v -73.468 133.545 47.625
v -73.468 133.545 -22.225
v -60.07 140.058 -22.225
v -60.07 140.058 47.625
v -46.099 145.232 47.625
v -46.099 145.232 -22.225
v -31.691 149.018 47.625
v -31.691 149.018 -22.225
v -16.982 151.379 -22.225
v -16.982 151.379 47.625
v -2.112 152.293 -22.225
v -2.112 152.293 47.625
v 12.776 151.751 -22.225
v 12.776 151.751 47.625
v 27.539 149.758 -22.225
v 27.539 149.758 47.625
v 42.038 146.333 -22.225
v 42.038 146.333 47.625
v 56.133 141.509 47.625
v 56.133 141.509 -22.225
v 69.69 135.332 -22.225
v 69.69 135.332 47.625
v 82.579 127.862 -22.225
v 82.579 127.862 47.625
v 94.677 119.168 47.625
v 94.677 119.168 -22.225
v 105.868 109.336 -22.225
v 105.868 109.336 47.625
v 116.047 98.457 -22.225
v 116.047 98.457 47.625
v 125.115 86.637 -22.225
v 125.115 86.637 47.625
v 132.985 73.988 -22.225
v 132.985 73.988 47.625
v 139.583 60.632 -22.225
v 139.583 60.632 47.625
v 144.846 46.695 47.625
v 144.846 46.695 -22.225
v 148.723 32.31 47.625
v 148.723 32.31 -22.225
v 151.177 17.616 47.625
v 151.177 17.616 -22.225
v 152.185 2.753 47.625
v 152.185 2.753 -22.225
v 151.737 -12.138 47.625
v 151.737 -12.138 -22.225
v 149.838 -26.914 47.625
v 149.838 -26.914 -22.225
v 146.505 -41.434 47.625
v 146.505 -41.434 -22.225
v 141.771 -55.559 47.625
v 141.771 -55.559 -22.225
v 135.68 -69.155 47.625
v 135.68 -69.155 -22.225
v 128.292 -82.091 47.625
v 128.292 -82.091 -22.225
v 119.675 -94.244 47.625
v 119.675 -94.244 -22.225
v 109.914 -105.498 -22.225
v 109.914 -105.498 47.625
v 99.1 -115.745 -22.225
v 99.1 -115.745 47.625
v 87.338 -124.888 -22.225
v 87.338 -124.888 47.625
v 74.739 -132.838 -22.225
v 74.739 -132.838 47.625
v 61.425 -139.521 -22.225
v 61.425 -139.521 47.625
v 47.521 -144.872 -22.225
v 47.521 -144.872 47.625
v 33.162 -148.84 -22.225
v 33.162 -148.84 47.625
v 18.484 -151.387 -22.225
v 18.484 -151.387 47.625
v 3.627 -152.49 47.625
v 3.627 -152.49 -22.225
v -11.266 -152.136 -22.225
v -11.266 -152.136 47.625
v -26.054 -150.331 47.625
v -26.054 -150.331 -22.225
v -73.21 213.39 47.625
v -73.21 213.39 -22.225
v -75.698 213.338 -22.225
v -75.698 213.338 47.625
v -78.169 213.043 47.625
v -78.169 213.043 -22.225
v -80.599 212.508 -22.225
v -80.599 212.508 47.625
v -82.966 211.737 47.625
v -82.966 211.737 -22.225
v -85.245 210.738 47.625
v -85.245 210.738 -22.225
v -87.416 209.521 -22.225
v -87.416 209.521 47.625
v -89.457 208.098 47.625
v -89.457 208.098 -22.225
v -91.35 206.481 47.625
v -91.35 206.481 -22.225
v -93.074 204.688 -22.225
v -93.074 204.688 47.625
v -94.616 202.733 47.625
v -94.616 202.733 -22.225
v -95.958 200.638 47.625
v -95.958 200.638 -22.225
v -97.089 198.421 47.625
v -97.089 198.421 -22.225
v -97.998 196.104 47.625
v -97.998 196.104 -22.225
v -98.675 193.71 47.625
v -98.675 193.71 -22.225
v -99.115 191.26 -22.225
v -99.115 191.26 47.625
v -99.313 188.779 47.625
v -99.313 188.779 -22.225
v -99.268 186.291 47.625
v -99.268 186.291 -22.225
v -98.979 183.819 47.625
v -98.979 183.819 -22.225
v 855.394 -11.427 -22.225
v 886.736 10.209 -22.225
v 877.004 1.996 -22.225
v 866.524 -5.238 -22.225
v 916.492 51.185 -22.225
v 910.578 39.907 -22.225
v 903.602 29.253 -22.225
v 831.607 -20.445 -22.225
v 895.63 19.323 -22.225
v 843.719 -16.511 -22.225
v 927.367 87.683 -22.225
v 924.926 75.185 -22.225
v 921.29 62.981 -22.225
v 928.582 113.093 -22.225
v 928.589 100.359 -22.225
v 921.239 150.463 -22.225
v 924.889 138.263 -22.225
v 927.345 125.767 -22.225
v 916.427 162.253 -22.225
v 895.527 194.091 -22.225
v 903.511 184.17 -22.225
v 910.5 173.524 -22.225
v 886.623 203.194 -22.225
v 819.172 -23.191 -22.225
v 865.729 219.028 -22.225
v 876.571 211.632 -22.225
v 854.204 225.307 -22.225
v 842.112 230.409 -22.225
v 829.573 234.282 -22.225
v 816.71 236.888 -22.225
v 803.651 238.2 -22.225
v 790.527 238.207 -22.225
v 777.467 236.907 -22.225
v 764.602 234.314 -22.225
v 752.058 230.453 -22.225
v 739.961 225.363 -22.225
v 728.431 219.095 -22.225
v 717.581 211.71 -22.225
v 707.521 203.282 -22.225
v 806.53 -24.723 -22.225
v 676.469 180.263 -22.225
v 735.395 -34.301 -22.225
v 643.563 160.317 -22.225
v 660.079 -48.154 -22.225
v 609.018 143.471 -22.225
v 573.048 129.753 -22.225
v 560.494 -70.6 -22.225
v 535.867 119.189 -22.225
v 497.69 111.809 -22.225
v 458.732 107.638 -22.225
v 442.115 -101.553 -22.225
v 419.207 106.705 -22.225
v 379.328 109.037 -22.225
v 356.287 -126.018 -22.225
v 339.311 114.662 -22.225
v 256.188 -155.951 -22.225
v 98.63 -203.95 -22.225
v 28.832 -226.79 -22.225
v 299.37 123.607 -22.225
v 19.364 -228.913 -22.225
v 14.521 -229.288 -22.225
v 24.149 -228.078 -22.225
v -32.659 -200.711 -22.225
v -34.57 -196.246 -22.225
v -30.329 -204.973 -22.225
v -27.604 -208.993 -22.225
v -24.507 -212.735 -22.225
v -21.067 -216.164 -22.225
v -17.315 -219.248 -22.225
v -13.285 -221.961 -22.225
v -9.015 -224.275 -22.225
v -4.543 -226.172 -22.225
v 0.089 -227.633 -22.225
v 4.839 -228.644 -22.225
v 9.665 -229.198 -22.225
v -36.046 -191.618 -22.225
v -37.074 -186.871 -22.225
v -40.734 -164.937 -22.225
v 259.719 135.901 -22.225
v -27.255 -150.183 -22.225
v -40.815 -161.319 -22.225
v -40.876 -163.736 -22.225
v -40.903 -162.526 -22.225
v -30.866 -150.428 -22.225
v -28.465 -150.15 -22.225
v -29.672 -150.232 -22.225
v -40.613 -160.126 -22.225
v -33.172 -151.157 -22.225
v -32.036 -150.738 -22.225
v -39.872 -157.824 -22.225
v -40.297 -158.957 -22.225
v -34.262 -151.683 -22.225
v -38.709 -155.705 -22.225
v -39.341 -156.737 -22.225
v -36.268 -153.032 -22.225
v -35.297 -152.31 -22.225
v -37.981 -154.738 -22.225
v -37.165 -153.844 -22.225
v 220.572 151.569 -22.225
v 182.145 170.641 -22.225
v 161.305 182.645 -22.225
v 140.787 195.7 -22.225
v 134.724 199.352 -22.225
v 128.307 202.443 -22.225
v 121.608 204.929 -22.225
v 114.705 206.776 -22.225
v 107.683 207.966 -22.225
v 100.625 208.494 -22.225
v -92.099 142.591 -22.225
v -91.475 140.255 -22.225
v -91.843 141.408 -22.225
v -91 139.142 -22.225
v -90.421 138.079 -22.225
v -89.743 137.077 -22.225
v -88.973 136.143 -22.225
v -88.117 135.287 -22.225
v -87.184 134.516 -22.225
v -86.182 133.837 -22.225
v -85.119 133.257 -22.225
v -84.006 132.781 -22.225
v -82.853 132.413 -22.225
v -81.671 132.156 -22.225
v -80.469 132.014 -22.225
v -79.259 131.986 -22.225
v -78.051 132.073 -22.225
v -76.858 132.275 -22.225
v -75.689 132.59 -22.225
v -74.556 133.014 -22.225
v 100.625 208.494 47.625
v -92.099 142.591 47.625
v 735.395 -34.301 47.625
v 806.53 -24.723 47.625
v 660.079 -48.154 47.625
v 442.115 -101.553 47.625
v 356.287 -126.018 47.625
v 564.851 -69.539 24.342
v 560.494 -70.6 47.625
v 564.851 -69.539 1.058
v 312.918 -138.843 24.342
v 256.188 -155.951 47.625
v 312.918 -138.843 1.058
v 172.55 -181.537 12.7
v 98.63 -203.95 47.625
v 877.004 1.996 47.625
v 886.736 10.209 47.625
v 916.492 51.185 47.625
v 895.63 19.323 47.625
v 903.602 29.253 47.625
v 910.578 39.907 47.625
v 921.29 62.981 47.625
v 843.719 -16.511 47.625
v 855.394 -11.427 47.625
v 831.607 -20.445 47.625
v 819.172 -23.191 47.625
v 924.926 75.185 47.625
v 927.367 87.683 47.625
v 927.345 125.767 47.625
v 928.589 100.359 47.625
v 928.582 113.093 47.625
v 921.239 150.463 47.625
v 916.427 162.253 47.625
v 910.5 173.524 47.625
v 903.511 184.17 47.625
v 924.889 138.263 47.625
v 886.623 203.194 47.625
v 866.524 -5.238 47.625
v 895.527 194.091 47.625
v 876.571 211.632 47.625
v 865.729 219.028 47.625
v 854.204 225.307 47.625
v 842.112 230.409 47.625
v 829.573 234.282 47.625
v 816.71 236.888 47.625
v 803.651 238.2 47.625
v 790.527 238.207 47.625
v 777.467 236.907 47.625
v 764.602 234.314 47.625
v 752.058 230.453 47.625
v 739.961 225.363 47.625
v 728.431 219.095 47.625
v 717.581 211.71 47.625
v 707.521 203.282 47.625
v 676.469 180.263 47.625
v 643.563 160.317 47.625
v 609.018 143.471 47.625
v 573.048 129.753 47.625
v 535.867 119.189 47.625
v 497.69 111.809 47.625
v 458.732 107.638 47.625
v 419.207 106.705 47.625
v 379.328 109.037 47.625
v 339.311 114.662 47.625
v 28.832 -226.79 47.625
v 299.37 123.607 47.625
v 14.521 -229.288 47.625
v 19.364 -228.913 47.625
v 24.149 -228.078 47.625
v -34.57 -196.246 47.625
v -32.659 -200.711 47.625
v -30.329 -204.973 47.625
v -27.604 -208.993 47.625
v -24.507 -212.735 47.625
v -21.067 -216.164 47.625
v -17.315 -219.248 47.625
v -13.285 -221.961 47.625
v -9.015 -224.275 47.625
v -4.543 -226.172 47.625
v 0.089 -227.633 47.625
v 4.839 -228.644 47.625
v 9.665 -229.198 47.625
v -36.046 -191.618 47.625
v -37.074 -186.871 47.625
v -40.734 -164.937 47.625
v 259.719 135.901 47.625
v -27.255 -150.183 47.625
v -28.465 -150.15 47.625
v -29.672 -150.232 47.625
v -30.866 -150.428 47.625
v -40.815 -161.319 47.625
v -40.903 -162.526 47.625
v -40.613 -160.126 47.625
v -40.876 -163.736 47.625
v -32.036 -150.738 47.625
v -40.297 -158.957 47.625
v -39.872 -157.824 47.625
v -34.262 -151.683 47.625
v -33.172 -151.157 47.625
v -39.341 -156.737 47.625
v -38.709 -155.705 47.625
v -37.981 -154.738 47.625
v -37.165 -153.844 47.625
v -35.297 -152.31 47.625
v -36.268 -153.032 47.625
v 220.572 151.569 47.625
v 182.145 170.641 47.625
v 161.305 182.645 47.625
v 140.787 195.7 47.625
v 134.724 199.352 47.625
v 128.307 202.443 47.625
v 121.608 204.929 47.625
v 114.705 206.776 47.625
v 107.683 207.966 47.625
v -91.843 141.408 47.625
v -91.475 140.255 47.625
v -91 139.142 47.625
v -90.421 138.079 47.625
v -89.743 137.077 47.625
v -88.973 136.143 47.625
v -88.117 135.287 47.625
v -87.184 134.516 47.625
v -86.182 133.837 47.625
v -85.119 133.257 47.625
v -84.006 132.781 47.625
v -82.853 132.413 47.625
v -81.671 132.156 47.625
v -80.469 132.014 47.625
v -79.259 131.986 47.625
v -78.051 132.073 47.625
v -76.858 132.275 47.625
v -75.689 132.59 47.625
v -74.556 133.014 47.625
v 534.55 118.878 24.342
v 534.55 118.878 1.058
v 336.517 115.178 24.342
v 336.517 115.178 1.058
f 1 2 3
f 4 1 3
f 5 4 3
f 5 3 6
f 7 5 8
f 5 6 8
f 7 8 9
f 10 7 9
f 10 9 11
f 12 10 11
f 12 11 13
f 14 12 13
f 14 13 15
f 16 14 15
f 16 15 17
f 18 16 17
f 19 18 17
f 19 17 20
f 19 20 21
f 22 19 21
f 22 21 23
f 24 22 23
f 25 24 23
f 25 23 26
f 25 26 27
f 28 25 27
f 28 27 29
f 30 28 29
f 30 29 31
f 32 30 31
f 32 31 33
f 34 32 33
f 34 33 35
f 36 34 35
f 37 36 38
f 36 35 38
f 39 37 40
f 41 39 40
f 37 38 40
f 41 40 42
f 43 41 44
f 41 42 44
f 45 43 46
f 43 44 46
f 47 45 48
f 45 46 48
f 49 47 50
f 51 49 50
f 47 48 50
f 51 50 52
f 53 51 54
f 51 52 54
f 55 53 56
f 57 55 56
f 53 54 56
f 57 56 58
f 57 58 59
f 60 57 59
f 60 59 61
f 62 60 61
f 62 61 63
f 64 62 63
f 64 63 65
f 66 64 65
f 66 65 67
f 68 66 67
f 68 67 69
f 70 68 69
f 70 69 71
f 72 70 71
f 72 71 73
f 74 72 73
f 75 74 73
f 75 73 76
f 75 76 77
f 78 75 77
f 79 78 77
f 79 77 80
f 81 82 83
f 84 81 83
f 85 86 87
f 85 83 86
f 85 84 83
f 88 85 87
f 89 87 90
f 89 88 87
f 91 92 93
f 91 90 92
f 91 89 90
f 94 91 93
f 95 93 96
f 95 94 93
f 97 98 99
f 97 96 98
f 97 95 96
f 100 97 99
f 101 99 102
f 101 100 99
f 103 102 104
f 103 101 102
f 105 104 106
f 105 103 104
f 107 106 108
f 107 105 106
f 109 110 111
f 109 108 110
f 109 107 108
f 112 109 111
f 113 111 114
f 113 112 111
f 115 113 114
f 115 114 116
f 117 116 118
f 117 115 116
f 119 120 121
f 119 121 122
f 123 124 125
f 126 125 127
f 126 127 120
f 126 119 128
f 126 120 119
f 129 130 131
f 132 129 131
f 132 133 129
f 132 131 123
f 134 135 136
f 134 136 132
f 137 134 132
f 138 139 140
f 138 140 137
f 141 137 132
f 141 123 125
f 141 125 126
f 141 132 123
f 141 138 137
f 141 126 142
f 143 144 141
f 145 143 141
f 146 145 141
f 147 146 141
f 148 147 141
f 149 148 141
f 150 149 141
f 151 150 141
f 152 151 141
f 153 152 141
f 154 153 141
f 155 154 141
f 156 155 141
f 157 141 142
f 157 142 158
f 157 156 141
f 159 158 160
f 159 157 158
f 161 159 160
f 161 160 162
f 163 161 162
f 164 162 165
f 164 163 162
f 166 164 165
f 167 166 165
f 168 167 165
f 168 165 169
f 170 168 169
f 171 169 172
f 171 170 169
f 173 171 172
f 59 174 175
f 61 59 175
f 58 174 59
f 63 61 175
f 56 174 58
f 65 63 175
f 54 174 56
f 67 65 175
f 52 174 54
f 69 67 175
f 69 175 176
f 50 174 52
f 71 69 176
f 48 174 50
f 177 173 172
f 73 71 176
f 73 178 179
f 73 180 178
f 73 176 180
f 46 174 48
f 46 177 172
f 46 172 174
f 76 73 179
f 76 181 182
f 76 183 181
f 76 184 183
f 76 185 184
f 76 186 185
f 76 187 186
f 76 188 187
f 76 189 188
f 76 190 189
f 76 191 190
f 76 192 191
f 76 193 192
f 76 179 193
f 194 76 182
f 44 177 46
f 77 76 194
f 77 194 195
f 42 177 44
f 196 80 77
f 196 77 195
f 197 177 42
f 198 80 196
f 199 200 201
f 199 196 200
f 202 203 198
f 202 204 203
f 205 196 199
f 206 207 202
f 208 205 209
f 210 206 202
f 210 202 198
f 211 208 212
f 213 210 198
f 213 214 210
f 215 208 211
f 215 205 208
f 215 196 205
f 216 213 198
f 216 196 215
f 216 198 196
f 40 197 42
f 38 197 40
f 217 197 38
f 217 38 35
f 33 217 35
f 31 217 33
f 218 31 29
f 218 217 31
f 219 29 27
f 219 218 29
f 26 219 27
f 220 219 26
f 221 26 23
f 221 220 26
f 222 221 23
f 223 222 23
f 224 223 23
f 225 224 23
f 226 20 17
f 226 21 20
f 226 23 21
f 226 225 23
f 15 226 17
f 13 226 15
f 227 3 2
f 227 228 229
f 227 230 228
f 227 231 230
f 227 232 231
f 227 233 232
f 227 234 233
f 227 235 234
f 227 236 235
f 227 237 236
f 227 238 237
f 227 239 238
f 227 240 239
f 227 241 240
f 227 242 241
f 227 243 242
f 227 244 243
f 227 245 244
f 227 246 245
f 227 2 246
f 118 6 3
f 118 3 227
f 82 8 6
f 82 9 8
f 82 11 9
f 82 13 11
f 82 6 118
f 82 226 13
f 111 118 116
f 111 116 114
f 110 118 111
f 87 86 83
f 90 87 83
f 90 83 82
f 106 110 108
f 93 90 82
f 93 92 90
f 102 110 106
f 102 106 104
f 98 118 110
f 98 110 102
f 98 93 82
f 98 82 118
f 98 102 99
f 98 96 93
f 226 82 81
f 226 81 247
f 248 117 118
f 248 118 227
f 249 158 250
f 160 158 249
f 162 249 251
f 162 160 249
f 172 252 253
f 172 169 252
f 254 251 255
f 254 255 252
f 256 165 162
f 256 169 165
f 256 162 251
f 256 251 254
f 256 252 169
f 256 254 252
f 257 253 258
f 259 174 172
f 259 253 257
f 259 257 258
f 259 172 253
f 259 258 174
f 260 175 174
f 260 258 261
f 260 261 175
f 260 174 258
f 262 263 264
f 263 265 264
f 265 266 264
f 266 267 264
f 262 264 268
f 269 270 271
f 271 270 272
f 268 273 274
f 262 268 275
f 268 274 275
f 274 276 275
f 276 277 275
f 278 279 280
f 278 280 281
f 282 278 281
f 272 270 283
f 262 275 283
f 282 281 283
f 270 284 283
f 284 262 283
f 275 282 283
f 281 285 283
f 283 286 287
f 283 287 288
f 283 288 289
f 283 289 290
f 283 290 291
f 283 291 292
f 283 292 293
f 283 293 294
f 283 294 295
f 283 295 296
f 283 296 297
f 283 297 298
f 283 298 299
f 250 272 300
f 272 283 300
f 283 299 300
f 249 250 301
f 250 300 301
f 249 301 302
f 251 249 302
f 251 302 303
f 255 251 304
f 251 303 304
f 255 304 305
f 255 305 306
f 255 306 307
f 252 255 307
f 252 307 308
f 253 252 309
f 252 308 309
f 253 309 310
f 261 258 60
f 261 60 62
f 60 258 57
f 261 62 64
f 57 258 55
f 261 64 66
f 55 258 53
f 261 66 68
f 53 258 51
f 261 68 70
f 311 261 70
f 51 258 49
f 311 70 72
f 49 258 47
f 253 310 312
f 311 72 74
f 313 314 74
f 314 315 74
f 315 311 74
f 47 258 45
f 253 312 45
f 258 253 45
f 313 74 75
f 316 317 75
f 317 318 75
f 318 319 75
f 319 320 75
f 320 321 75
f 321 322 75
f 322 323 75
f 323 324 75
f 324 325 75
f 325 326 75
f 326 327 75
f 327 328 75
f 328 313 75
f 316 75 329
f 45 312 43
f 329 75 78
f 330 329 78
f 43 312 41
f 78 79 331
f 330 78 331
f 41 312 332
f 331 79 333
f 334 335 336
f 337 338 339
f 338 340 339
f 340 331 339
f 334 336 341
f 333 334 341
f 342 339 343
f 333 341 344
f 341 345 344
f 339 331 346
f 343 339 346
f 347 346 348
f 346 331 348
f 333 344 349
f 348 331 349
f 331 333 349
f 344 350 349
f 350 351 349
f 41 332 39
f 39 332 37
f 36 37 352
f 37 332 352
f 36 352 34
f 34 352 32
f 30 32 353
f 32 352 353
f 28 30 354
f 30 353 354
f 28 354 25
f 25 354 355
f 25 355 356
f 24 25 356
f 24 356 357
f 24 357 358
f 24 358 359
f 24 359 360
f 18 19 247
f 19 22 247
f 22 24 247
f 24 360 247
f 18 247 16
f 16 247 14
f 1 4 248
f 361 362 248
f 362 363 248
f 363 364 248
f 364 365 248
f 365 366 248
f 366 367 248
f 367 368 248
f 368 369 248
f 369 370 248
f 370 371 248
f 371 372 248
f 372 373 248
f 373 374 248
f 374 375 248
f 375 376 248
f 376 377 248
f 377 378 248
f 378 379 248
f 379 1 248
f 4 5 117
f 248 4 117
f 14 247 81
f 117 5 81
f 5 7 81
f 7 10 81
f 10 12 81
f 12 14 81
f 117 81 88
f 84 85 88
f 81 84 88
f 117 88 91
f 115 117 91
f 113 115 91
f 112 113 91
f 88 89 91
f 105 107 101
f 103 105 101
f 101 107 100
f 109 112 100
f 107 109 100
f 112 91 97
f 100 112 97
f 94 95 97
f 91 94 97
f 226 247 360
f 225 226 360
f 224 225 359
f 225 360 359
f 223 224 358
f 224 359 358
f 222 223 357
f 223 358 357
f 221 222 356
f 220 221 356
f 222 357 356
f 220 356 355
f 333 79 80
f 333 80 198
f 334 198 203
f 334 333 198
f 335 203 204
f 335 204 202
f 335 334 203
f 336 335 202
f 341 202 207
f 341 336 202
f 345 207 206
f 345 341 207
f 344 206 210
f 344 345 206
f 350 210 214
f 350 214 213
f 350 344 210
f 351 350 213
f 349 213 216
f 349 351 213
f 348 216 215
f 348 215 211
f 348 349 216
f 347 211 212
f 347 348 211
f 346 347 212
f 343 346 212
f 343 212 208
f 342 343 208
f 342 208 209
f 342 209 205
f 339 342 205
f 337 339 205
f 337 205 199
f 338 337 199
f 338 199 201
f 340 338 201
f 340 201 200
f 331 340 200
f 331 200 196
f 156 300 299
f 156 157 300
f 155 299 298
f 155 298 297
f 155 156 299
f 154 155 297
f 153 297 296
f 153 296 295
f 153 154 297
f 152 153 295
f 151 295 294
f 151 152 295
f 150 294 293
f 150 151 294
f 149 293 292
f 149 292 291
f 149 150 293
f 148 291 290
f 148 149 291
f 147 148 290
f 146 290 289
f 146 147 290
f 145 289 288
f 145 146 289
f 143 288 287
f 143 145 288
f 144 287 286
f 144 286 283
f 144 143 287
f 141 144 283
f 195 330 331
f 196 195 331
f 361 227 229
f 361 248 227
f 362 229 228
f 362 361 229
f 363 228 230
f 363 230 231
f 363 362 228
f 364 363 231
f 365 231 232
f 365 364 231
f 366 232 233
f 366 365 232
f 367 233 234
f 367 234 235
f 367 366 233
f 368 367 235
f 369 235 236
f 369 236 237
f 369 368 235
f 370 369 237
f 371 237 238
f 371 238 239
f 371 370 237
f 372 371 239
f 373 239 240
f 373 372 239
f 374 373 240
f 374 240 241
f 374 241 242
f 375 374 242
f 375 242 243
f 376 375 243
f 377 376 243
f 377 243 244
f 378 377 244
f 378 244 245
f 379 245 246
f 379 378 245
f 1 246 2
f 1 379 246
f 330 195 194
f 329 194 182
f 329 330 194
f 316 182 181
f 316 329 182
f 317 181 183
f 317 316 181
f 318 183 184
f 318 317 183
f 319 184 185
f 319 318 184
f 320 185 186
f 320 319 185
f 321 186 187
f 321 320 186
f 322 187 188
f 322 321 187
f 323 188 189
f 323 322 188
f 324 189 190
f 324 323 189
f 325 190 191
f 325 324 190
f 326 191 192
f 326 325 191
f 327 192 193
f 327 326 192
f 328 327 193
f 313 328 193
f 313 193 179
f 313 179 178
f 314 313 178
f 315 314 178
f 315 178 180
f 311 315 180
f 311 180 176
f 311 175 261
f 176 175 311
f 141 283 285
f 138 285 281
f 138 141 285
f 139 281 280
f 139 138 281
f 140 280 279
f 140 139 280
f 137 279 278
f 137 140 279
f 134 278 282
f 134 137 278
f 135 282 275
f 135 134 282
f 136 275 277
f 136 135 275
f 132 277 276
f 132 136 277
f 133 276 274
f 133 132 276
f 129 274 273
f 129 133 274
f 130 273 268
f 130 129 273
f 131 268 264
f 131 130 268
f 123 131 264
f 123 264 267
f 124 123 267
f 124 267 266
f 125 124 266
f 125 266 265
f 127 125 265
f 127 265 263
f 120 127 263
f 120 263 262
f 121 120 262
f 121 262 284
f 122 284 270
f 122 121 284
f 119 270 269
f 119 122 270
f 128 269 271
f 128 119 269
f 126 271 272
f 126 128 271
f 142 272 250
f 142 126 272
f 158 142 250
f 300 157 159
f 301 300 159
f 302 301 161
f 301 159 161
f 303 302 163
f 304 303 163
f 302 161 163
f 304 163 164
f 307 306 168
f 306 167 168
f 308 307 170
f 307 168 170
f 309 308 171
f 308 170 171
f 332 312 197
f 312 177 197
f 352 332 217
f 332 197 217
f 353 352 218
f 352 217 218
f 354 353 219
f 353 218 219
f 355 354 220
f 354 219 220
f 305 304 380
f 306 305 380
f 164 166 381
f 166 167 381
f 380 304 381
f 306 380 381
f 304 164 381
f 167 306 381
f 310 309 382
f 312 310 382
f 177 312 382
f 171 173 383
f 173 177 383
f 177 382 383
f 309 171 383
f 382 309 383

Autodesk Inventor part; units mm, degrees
ref_plane "YZ Plane" through (0, 0, 0) normal (1, 0, 0) x (0, 1, 0)
ref_plane "XZ Plane" through (0, 0, 0) normal (0, 1, 0) x (-1, 0, 0)
ref_plane "XY Plane" through (0, 0, 0) normal (0, 0, 1) x (1, 0, 0)
ref_plane "Work Plane1" through (0, 0, -22.225) normal (0, 0, -1) x (-1, 0, 0)
sketch "Sketch1" plane through (0, 0, -22.225) normal (0, 0, -1) x (-1, 0, 0)
  arc A0 (88.9626, 123.799) -> (43.8693, -146.1511) centre (0.2092, -0.1167) ccw
  line L0 (104.0584, 214.2592) -> (-123.3104, 207.8545)
  line L1 (104.0584, 214.2592) -> (88.9626, 123.799)
  line L2 (27.3448, -245.173) -> (43.8693, -146.1511)
  spline S0 degree 3 poles (-707.521, 203.2816) (-551.4111, 75.786) (-311.6058, 71.5174) (-123.3104, 207.8545) knots 0 0 0 0 1 1 1 1
  spline S1 degree 3 poles (-813.9039, -23.98) (-592.8487, -45.4285) (-280.1393, -149.9031) (-98.6304, -203.95) knots 0 0 0 0 1 1 1 1
  line L3 (-98.6304, -203.95) -> (27.3448, -245.173)
  arc A1 (-707.521, 203.2816) -> (-707.521, 203.2816) centre (-797.0248, 106.6489) ccw
  arc A2 (-707.521, 203.2816) -> (-707.521, 203.2816) centre (-797.0248, 106.6489) ccw
  line L4 (-754.135, 241.3513) -> (-660.9071, 165.2118) construction
  arc A3 (-742.7917, 235.6937) -> (-668.7166, 175.1963) centre (-447.712, 521.4005) ccw construction
  line L5 (-880.3002, -17.5377) -> (-747.5076, -30.4223) construction
  arc A4 (-760.9988, -30.537) -> (-867.0828, -20.2439) centre (-910.7419, -1022.0239) ccw construction
  arc A5 (-707.521, 203.2816) -> (-807.2552, -24.6472) centre (-797.0248, 106.6609) ccw
  point P0 (-439.0779, 106.766)
  point P1 (-428.475, -105.3455)
extrude "Extrusion1" add sketch "Sketch1" against normal blind 69.85
fillet "Fillet1" radius 25.4 1 edges at (-104.0584, 214.2592, 12.7)
fillet "Fillet2" radius 50.8 1 edges at (-27.3448, -245.173, 12.7)
fillet "Fillet4" radius 76.2 1 edges at (123.3104, 207.8545, 12.7)
fillet "Fillet5" radius 12.7 2 edges at (-43.8693, -146.1511, 12.7) (-88.9626, 123.799, 12.7)
properties material "Wood (Walnut)"
